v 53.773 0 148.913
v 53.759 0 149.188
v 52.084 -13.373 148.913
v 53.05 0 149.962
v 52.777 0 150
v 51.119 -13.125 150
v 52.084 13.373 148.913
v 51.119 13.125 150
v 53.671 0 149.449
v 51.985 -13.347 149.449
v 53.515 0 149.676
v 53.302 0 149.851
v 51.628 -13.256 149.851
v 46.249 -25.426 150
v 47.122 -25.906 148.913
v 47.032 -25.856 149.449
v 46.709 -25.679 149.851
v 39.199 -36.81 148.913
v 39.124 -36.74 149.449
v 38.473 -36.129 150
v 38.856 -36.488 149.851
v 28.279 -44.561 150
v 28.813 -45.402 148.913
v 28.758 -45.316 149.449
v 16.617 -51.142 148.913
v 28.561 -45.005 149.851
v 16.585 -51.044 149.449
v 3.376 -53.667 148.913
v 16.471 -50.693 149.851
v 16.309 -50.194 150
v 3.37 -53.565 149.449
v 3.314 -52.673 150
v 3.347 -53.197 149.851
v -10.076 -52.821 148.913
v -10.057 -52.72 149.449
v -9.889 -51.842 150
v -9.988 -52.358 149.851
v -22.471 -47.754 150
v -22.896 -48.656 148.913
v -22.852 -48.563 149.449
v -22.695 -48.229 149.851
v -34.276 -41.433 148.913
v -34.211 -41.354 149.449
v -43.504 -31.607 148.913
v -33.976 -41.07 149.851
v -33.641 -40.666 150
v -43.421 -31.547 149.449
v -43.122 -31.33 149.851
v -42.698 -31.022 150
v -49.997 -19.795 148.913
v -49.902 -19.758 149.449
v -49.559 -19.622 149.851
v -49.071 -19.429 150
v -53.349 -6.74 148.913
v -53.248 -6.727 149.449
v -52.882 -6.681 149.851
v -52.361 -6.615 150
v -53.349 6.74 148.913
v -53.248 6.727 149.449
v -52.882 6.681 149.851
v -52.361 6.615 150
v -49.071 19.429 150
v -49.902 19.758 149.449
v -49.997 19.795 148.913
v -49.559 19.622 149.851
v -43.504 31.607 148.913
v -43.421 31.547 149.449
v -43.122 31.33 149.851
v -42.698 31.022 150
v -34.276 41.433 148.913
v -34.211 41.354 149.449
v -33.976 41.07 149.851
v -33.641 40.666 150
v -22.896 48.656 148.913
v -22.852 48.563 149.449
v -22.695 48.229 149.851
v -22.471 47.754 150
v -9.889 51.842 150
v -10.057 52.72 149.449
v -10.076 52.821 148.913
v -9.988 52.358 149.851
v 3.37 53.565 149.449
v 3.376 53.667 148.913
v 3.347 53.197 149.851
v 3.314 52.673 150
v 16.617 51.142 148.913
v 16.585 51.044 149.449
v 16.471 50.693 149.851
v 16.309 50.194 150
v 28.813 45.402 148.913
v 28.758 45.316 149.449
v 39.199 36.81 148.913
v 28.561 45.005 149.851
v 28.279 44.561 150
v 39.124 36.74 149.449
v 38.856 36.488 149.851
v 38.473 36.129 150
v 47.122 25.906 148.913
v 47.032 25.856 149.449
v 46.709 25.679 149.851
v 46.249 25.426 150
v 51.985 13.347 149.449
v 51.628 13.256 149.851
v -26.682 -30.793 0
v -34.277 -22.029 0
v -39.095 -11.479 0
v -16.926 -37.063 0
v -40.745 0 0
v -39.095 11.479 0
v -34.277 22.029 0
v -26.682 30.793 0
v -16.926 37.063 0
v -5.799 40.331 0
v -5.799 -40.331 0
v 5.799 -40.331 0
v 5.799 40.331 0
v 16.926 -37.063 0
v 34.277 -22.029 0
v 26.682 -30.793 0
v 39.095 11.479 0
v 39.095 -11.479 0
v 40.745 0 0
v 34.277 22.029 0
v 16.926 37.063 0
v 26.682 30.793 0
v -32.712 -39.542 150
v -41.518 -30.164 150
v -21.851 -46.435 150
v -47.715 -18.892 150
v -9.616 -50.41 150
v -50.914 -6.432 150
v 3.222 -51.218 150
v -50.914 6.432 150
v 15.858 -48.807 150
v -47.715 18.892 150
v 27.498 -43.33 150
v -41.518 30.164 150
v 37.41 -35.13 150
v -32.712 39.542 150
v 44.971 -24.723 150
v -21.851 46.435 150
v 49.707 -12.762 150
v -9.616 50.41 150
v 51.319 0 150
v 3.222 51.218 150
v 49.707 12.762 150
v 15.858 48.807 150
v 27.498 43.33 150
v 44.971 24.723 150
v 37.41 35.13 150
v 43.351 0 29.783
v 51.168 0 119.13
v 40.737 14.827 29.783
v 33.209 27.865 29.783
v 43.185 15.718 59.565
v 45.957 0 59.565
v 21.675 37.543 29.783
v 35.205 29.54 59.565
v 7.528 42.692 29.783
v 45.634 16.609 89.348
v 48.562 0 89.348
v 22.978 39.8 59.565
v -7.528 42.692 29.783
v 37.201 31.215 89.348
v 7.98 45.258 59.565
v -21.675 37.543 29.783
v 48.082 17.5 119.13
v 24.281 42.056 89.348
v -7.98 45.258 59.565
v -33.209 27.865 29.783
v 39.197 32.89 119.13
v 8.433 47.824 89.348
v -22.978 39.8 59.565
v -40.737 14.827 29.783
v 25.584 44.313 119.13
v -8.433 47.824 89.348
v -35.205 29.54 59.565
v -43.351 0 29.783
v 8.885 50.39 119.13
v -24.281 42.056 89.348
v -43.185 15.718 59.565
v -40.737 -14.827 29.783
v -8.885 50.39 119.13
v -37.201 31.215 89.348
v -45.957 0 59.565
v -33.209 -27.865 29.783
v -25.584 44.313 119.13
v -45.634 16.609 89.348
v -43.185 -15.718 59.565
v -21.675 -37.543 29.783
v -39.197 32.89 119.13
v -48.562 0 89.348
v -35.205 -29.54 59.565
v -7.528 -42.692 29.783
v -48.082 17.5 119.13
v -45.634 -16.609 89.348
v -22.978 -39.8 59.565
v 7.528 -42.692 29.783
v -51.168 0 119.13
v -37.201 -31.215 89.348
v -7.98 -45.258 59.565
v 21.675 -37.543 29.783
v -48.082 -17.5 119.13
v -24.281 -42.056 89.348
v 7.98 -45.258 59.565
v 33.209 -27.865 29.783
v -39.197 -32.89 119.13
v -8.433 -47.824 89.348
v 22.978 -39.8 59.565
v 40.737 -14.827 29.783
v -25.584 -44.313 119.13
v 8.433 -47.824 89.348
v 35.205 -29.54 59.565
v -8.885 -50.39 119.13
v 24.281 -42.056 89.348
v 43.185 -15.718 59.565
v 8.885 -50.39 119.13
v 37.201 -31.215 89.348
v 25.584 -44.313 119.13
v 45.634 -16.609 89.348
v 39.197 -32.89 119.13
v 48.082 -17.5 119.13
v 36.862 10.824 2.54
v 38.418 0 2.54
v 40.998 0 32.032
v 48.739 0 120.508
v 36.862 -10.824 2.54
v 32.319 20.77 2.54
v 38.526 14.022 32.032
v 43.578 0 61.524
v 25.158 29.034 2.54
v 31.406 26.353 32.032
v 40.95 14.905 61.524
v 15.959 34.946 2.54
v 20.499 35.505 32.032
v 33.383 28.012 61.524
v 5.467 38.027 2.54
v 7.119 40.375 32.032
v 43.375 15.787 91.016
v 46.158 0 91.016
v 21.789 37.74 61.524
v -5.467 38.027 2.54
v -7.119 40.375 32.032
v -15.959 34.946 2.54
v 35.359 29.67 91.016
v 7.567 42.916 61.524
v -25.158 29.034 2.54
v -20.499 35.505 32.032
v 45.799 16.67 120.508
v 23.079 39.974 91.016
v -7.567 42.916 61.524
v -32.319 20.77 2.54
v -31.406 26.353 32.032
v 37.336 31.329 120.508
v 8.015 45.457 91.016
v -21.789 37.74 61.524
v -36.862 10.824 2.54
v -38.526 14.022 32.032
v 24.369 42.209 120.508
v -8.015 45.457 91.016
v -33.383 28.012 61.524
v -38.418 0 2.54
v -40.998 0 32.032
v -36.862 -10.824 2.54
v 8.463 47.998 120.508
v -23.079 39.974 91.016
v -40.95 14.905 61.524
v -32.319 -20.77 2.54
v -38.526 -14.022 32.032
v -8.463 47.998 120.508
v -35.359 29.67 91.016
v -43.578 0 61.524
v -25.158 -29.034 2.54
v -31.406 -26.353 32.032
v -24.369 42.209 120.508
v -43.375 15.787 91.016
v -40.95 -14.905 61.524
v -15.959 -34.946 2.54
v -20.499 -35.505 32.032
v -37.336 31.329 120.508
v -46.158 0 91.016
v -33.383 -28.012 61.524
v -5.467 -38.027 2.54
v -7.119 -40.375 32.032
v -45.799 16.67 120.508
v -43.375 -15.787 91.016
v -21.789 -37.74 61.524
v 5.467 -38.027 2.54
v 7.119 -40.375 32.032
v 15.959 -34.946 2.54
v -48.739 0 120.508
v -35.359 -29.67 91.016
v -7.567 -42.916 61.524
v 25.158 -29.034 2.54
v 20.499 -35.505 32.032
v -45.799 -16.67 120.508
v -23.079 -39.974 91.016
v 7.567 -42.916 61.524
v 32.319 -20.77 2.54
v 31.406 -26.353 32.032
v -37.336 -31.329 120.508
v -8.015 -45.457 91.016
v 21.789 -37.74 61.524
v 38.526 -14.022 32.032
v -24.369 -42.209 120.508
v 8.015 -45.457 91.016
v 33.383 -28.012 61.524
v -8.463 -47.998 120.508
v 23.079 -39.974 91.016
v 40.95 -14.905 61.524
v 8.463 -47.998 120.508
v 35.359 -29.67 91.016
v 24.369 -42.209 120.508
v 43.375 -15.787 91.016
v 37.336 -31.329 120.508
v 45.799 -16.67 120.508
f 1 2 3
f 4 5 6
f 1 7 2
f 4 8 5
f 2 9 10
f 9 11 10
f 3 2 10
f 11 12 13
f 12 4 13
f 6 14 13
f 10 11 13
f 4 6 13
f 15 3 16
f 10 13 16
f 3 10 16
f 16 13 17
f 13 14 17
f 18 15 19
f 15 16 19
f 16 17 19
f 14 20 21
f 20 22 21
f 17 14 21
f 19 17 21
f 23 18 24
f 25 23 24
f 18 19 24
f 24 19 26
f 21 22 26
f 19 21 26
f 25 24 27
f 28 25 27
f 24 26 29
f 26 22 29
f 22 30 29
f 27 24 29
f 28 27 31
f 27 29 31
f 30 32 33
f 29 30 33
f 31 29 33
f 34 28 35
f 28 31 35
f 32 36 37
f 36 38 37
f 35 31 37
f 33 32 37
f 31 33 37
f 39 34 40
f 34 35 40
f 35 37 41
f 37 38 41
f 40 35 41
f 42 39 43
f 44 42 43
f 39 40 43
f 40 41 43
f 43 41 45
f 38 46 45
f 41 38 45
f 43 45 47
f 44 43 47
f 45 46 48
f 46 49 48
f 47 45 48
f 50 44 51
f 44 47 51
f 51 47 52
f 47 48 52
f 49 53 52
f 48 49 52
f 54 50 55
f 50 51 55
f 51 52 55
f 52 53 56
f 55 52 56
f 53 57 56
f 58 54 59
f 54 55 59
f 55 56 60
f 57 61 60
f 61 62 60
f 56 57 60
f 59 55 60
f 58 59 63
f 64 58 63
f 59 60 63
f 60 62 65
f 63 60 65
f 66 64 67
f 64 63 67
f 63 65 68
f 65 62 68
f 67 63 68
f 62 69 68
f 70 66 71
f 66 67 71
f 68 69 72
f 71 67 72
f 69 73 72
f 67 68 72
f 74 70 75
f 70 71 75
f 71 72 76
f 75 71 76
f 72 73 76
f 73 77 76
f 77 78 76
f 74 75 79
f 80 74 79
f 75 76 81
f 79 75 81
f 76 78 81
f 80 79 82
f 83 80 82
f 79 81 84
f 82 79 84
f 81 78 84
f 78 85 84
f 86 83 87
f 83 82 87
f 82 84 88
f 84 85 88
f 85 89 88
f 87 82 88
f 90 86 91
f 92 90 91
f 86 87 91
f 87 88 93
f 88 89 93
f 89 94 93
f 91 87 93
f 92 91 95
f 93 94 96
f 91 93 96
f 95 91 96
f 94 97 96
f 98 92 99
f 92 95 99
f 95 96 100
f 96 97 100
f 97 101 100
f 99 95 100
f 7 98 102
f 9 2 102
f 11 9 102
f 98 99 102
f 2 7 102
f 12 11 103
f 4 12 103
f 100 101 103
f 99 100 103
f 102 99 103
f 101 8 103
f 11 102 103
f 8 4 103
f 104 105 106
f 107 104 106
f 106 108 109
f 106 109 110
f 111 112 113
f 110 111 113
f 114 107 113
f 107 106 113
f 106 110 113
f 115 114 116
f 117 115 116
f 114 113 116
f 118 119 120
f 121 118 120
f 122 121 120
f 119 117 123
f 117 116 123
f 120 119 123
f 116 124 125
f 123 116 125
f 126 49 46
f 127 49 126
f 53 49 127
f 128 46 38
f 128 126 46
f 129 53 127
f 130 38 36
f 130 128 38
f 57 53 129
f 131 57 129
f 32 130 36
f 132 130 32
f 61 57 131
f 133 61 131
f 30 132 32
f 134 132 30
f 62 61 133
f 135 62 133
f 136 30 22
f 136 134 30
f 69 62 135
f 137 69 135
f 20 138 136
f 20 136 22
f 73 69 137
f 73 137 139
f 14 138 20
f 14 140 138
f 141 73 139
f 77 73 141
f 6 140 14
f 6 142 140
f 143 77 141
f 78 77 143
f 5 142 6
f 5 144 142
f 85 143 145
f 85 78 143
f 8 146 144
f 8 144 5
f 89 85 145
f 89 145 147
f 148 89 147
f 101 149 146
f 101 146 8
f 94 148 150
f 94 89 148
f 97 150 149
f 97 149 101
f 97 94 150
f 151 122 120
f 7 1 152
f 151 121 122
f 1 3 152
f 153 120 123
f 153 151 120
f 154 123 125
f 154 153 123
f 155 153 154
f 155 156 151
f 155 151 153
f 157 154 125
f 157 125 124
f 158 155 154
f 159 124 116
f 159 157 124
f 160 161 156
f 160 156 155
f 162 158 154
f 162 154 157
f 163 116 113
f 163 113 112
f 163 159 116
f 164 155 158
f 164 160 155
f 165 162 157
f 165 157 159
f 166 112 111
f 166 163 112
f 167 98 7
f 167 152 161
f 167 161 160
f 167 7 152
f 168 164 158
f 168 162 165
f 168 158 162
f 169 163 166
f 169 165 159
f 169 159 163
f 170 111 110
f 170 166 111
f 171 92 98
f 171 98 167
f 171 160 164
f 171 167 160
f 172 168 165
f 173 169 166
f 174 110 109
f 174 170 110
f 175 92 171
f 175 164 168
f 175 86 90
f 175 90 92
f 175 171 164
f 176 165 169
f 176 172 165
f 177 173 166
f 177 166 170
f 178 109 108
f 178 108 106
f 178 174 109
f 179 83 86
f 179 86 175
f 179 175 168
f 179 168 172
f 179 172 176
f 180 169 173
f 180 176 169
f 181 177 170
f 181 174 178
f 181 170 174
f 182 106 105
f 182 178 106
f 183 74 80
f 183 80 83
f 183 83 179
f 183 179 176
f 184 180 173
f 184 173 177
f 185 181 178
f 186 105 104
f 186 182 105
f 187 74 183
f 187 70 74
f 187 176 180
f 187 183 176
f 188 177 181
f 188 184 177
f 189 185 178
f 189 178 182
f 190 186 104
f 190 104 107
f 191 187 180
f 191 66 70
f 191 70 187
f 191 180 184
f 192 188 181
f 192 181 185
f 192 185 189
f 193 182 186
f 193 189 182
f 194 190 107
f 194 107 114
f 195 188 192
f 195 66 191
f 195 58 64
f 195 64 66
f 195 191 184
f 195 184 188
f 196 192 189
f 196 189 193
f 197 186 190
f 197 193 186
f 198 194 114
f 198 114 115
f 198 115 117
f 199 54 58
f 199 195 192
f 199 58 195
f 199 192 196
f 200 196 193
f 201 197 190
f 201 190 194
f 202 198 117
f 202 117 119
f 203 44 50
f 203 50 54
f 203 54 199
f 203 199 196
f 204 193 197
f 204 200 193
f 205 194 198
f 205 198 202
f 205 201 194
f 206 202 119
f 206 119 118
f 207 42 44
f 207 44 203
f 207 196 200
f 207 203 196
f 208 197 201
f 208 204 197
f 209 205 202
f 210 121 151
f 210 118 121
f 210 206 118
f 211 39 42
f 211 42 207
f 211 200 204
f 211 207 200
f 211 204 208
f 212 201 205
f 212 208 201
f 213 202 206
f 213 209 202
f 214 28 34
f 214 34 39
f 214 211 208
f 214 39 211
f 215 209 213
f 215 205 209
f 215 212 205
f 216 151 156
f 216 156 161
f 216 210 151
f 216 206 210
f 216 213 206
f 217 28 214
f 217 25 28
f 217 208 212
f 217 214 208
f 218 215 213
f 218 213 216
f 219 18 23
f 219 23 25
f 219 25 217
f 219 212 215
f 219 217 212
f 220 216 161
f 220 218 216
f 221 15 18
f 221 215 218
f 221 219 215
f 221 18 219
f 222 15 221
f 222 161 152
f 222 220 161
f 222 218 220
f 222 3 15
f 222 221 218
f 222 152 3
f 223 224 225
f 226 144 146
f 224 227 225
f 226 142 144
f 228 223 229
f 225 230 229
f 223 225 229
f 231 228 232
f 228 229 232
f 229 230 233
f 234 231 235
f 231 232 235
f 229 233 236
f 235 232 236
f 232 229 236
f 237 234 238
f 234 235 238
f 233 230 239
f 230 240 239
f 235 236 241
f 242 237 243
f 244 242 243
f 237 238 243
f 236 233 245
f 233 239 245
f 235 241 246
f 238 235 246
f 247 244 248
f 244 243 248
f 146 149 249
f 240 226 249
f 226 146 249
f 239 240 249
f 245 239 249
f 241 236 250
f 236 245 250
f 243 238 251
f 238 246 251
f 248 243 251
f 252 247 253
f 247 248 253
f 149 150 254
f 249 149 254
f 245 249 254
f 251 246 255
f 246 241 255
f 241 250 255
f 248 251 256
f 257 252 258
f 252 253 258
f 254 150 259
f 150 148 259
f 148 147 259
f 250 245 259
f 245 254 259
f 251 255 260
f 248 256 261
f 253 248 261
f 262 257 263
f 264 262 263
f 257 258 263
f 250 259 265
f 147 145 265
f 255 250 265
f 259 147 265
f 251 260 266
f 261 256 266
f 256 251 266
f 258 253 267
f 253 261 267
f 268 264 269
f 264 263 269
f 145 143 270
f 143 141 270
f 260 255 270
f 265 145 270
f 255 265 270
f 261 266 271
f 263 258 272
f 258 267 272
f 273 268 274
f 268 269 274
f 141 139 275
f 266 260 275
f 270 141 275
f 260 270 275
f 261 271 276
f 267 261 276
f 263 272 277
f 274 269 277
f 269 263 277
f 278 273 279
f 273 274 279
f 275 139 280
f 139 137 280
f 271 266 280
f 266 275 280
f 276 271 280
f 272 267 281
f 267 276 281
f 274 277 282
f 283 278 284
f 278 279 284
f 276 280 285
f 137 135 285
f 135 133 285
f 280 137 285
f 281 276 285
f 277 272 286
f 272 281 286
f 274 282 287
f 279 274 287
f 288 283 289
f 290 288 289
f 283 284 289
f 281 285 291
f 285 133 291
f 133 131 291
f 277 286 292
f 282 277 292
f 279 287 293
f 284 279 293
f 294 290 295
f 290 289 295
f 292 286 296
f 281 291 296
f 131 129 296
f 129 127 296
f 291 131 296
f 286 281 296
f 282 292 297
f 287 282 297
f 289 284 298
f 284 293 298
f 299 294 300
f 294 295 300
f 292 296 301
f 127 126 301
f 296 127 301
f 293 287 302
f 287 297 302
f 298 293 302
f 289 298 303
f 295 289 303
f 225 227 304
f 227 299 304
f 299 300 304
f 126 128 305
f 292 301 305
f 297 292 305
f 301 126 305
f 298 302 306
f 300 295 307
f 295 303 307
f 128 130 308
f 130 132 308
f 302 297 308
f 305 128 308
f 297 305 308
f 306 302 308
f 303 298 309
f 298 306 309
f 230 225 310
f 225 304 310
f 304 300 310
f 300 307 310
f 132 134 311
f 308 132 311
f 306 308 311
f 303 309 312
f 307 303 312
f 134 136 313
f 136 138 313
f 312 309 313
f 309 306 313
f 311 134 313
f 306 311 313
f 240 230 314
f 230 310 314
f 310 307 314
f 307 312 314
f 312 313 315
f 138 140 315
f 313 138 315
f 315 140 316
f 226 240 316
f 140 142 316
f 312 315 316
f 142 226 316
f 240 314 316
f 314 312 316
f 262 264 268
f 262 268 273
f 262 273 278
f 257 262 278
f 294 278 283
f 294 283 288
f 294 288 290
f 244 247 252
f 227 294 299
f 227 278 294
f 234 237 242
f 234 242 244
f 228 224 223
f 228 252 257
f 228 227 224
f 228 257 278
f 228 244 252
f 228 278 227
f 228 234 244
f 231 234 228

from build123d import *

# Parameters (mm, degrees)
F0_R     = 40.7452616352
F1_DEPTH = 150
F1_TAPER = -5
F2_T     = -2.54
F3_R     = 1


with BuildPart() as f1:
    # F0 (on Top) → F1 (new body)
    with BuildSketch(Plane.XY):
        Circle(F0_R)
    extrude(amount=F1_DEPTH, taper=F1_TAPER)

    # F2
    f2_openings = [f1.faces().sort_by_distance(p)[0] for p in [
        (0, 0, 150),
    ]]
    offset(amount=F2_T, openings=f2_openings, kind=Kind.INTERSECTION)

    # F3
    f3_edges = [f1.edges().sort_by_distance(p)[0] for p in [
        (-53.868561, 0, 150),
    ]]
    fillet(f3_edges, radius=F3_R)


solid = f1.part
